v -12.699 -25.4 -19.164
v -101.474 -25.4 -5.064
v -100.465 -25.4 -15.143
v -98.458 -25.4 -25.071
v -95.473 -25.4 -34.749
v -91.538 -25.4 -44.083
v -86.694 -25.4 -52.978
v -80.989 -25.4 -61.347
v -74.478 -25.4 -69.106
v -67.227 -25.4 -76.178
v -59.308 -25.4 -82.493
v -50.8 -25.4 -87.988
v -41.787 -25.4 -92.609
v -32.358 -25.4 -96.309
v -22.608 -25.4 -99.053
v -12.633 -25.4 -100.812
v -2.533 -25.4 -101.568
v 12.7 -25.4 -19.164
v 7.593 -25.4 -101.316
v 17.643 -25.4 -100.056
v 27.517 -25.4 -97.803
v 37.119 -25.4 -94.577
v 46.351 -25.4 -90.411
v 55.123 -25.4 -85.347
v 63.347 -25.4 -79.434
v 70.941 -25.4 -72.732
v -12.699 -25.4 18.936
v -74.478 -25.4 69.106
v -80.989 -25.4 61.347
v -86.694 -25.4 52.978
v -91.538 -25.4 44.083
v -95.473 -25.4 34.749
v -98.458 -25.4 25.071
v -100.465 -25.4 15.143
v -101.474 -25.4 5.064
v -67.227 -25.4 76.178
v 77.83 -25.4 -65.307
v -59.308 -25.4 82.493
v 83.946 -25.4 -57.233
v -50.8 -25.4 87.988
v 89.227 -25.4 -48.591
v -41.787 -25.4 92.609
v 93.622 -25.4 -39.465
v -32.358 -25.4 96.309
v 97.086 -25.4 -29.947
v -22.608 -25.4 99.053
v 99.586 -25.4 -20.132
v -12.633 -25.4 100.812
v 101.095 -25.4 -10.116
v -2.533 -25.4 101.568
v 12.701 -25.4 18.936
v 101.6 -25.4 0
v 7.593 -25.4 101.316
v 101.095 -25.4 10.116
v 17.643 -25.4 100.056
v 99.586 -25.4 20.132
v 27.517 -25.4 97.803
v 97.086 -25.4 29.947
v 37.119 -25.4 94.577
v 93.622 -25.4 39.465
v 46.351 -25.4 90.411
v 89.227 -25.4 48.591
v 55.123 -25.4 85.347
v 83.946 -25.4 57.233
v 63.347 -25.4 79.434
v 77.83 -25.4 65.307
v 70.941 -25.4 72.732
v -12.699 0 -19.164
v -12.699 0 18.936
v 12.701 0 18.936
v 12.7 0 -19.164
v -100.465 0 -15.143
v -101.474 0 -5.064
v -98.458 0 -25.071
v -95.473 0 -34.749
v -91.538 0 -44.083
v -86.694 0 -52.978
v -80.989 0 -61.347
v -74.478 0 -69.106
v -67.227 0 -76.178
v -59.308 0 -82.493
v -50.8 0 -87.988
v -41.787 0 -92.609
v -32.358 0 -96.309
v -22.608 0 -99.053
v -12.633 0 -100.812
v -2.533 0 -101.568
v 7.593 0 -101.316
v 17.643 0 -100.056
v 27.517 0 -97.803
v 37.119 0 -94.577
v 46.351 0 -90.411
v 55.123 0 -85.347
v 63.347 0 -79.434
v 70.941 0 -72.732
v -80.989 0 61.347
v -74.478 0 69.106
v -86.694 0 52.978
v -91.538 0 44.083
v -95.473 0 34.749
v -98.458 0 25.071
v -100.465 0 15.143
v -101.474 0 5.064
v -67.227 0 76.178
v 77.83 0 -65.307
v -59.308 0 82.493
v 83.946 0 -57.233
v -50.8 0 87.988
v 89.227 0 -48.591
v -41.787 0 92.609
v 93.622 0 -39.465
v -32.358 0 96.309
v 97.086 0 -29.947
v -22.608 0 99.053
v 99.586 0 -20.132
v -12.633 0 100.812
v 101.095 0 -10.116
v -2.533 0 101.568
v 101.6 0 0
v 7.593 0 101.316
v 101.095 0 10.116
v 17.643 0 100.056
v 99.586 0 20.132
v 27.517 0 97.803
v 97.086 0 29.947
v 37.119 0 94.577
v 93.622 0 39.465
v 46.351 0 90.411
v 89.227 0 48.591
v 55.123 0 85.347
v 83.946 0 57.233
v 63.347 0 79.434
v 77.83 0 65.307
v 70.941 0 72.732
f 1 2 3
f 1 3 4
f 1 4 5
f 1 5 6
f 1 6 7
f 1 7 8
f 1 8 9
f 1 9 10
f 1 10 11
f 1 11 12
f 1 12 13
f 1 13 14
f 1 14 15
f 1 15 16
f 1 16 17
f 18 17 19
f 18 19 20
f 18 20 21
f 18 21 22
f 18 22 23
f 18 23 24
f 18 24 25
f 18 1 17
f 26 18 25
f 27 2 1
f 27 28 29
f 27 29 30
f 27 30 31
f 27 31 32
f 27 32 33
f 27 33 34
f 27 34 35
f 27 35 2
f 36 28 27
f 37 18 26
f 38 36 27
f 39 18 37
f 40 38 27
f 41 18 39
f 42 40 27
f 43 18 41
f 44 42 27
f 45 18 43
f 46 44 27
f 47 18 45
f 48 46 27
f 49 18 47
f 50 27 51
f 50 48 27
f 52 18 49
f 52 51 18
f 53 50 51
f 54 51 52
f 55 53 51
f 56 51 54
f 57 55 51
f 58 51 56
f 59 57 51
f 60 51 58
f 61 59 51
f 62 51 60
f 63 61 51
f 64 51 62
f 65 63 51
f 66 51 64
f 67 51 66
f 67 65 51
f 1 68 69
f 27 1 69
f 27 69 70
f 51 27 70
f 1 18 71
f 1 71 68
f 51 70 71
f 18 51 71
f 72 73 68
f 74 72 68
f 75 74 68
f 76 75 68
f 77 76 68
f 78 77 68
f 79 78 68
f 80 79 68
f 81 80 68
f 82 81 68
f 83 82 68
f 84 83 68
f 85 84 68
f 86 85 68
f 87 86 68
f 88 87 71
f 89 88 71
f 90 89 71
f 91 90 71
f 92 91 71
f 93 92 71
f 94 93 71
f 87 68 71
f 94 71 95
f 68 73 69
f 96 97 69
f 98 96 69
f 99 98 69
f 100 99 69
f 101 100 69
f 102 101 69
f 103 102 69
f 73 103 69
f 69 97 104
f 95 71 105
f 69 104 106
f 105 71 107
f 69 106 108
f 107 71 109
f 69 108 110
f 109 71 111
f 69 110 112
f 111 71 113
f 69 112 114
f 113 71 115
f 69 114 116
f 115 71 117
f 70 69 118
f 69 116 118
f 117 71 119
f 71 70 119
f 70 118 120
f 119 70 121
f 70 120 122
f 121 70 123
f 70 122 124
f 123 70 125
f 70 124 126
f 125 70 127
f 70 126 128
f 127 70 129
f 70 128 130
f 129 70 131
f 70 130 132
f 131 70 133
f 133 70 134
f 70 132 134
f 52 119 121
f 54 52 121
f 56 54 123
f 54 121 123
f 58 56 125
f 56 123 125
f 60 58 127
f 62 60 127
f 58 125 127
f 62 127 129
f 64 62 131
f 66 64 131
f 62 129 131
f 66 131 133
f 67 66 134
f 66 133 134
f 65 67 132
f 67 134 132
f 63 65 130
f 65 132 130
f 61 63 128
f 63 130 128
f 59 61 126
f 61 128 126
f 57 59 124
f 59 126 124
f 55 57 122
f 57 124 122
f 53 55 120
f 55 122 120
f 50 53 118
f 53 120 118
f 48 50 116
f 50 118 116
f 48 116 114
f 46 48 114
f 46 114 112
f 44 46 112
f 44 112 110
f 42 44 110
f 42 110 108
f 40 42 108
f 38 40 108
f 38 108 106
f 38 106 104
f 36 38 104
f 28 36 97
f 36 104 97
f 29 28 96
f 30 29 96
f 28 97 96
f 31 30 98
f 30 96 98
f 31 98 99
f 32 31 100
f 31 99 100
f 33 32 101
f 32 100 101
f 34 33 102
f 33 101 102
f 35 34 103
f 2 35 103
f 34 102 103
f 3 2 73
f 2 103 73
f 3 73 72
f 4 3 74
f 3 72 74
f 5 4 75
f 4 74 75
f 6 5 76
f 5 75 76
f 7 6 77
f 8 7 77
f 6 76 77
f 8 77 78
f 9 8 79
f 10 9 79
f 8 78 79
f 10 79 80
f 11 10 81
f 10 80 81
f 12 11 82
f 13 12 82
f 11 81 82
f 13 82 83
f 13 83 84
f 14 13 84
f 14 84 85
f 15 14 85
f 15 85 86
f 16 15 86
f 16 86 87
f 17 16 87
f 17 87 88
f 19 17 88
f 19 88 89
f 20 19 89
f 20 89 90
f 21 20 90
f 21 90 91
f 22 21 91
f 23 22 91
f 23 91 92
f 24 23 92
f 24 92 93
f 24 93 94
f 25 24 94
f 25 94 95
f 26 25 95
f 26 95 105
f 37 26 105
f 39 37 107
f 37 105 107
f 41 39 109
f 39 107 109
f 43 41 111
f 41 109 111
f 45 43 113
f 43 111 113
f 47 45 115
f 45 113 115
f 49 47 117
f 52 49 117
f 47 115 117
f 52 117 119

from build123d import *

# Parameters (mm, degrees)
F0_R     = 101.6
F1_DEPTH = 25.4


with BuildPart() as f1:
    # F0 (on Front) → F1 (new body)
    with BuildSketch(Plane.XZ):
        Circle(F0_R)
        Polygon((-12.69949, -19.163814), (-12.69949, -0.113814), (-12.69949, 18.936186), (12.70051, 18.936186), (12.7, -19.163814), align=None, mode=Mode.SUBTRACT)
    extrude(amount=F1_DEPTH)


solid = f1.part
